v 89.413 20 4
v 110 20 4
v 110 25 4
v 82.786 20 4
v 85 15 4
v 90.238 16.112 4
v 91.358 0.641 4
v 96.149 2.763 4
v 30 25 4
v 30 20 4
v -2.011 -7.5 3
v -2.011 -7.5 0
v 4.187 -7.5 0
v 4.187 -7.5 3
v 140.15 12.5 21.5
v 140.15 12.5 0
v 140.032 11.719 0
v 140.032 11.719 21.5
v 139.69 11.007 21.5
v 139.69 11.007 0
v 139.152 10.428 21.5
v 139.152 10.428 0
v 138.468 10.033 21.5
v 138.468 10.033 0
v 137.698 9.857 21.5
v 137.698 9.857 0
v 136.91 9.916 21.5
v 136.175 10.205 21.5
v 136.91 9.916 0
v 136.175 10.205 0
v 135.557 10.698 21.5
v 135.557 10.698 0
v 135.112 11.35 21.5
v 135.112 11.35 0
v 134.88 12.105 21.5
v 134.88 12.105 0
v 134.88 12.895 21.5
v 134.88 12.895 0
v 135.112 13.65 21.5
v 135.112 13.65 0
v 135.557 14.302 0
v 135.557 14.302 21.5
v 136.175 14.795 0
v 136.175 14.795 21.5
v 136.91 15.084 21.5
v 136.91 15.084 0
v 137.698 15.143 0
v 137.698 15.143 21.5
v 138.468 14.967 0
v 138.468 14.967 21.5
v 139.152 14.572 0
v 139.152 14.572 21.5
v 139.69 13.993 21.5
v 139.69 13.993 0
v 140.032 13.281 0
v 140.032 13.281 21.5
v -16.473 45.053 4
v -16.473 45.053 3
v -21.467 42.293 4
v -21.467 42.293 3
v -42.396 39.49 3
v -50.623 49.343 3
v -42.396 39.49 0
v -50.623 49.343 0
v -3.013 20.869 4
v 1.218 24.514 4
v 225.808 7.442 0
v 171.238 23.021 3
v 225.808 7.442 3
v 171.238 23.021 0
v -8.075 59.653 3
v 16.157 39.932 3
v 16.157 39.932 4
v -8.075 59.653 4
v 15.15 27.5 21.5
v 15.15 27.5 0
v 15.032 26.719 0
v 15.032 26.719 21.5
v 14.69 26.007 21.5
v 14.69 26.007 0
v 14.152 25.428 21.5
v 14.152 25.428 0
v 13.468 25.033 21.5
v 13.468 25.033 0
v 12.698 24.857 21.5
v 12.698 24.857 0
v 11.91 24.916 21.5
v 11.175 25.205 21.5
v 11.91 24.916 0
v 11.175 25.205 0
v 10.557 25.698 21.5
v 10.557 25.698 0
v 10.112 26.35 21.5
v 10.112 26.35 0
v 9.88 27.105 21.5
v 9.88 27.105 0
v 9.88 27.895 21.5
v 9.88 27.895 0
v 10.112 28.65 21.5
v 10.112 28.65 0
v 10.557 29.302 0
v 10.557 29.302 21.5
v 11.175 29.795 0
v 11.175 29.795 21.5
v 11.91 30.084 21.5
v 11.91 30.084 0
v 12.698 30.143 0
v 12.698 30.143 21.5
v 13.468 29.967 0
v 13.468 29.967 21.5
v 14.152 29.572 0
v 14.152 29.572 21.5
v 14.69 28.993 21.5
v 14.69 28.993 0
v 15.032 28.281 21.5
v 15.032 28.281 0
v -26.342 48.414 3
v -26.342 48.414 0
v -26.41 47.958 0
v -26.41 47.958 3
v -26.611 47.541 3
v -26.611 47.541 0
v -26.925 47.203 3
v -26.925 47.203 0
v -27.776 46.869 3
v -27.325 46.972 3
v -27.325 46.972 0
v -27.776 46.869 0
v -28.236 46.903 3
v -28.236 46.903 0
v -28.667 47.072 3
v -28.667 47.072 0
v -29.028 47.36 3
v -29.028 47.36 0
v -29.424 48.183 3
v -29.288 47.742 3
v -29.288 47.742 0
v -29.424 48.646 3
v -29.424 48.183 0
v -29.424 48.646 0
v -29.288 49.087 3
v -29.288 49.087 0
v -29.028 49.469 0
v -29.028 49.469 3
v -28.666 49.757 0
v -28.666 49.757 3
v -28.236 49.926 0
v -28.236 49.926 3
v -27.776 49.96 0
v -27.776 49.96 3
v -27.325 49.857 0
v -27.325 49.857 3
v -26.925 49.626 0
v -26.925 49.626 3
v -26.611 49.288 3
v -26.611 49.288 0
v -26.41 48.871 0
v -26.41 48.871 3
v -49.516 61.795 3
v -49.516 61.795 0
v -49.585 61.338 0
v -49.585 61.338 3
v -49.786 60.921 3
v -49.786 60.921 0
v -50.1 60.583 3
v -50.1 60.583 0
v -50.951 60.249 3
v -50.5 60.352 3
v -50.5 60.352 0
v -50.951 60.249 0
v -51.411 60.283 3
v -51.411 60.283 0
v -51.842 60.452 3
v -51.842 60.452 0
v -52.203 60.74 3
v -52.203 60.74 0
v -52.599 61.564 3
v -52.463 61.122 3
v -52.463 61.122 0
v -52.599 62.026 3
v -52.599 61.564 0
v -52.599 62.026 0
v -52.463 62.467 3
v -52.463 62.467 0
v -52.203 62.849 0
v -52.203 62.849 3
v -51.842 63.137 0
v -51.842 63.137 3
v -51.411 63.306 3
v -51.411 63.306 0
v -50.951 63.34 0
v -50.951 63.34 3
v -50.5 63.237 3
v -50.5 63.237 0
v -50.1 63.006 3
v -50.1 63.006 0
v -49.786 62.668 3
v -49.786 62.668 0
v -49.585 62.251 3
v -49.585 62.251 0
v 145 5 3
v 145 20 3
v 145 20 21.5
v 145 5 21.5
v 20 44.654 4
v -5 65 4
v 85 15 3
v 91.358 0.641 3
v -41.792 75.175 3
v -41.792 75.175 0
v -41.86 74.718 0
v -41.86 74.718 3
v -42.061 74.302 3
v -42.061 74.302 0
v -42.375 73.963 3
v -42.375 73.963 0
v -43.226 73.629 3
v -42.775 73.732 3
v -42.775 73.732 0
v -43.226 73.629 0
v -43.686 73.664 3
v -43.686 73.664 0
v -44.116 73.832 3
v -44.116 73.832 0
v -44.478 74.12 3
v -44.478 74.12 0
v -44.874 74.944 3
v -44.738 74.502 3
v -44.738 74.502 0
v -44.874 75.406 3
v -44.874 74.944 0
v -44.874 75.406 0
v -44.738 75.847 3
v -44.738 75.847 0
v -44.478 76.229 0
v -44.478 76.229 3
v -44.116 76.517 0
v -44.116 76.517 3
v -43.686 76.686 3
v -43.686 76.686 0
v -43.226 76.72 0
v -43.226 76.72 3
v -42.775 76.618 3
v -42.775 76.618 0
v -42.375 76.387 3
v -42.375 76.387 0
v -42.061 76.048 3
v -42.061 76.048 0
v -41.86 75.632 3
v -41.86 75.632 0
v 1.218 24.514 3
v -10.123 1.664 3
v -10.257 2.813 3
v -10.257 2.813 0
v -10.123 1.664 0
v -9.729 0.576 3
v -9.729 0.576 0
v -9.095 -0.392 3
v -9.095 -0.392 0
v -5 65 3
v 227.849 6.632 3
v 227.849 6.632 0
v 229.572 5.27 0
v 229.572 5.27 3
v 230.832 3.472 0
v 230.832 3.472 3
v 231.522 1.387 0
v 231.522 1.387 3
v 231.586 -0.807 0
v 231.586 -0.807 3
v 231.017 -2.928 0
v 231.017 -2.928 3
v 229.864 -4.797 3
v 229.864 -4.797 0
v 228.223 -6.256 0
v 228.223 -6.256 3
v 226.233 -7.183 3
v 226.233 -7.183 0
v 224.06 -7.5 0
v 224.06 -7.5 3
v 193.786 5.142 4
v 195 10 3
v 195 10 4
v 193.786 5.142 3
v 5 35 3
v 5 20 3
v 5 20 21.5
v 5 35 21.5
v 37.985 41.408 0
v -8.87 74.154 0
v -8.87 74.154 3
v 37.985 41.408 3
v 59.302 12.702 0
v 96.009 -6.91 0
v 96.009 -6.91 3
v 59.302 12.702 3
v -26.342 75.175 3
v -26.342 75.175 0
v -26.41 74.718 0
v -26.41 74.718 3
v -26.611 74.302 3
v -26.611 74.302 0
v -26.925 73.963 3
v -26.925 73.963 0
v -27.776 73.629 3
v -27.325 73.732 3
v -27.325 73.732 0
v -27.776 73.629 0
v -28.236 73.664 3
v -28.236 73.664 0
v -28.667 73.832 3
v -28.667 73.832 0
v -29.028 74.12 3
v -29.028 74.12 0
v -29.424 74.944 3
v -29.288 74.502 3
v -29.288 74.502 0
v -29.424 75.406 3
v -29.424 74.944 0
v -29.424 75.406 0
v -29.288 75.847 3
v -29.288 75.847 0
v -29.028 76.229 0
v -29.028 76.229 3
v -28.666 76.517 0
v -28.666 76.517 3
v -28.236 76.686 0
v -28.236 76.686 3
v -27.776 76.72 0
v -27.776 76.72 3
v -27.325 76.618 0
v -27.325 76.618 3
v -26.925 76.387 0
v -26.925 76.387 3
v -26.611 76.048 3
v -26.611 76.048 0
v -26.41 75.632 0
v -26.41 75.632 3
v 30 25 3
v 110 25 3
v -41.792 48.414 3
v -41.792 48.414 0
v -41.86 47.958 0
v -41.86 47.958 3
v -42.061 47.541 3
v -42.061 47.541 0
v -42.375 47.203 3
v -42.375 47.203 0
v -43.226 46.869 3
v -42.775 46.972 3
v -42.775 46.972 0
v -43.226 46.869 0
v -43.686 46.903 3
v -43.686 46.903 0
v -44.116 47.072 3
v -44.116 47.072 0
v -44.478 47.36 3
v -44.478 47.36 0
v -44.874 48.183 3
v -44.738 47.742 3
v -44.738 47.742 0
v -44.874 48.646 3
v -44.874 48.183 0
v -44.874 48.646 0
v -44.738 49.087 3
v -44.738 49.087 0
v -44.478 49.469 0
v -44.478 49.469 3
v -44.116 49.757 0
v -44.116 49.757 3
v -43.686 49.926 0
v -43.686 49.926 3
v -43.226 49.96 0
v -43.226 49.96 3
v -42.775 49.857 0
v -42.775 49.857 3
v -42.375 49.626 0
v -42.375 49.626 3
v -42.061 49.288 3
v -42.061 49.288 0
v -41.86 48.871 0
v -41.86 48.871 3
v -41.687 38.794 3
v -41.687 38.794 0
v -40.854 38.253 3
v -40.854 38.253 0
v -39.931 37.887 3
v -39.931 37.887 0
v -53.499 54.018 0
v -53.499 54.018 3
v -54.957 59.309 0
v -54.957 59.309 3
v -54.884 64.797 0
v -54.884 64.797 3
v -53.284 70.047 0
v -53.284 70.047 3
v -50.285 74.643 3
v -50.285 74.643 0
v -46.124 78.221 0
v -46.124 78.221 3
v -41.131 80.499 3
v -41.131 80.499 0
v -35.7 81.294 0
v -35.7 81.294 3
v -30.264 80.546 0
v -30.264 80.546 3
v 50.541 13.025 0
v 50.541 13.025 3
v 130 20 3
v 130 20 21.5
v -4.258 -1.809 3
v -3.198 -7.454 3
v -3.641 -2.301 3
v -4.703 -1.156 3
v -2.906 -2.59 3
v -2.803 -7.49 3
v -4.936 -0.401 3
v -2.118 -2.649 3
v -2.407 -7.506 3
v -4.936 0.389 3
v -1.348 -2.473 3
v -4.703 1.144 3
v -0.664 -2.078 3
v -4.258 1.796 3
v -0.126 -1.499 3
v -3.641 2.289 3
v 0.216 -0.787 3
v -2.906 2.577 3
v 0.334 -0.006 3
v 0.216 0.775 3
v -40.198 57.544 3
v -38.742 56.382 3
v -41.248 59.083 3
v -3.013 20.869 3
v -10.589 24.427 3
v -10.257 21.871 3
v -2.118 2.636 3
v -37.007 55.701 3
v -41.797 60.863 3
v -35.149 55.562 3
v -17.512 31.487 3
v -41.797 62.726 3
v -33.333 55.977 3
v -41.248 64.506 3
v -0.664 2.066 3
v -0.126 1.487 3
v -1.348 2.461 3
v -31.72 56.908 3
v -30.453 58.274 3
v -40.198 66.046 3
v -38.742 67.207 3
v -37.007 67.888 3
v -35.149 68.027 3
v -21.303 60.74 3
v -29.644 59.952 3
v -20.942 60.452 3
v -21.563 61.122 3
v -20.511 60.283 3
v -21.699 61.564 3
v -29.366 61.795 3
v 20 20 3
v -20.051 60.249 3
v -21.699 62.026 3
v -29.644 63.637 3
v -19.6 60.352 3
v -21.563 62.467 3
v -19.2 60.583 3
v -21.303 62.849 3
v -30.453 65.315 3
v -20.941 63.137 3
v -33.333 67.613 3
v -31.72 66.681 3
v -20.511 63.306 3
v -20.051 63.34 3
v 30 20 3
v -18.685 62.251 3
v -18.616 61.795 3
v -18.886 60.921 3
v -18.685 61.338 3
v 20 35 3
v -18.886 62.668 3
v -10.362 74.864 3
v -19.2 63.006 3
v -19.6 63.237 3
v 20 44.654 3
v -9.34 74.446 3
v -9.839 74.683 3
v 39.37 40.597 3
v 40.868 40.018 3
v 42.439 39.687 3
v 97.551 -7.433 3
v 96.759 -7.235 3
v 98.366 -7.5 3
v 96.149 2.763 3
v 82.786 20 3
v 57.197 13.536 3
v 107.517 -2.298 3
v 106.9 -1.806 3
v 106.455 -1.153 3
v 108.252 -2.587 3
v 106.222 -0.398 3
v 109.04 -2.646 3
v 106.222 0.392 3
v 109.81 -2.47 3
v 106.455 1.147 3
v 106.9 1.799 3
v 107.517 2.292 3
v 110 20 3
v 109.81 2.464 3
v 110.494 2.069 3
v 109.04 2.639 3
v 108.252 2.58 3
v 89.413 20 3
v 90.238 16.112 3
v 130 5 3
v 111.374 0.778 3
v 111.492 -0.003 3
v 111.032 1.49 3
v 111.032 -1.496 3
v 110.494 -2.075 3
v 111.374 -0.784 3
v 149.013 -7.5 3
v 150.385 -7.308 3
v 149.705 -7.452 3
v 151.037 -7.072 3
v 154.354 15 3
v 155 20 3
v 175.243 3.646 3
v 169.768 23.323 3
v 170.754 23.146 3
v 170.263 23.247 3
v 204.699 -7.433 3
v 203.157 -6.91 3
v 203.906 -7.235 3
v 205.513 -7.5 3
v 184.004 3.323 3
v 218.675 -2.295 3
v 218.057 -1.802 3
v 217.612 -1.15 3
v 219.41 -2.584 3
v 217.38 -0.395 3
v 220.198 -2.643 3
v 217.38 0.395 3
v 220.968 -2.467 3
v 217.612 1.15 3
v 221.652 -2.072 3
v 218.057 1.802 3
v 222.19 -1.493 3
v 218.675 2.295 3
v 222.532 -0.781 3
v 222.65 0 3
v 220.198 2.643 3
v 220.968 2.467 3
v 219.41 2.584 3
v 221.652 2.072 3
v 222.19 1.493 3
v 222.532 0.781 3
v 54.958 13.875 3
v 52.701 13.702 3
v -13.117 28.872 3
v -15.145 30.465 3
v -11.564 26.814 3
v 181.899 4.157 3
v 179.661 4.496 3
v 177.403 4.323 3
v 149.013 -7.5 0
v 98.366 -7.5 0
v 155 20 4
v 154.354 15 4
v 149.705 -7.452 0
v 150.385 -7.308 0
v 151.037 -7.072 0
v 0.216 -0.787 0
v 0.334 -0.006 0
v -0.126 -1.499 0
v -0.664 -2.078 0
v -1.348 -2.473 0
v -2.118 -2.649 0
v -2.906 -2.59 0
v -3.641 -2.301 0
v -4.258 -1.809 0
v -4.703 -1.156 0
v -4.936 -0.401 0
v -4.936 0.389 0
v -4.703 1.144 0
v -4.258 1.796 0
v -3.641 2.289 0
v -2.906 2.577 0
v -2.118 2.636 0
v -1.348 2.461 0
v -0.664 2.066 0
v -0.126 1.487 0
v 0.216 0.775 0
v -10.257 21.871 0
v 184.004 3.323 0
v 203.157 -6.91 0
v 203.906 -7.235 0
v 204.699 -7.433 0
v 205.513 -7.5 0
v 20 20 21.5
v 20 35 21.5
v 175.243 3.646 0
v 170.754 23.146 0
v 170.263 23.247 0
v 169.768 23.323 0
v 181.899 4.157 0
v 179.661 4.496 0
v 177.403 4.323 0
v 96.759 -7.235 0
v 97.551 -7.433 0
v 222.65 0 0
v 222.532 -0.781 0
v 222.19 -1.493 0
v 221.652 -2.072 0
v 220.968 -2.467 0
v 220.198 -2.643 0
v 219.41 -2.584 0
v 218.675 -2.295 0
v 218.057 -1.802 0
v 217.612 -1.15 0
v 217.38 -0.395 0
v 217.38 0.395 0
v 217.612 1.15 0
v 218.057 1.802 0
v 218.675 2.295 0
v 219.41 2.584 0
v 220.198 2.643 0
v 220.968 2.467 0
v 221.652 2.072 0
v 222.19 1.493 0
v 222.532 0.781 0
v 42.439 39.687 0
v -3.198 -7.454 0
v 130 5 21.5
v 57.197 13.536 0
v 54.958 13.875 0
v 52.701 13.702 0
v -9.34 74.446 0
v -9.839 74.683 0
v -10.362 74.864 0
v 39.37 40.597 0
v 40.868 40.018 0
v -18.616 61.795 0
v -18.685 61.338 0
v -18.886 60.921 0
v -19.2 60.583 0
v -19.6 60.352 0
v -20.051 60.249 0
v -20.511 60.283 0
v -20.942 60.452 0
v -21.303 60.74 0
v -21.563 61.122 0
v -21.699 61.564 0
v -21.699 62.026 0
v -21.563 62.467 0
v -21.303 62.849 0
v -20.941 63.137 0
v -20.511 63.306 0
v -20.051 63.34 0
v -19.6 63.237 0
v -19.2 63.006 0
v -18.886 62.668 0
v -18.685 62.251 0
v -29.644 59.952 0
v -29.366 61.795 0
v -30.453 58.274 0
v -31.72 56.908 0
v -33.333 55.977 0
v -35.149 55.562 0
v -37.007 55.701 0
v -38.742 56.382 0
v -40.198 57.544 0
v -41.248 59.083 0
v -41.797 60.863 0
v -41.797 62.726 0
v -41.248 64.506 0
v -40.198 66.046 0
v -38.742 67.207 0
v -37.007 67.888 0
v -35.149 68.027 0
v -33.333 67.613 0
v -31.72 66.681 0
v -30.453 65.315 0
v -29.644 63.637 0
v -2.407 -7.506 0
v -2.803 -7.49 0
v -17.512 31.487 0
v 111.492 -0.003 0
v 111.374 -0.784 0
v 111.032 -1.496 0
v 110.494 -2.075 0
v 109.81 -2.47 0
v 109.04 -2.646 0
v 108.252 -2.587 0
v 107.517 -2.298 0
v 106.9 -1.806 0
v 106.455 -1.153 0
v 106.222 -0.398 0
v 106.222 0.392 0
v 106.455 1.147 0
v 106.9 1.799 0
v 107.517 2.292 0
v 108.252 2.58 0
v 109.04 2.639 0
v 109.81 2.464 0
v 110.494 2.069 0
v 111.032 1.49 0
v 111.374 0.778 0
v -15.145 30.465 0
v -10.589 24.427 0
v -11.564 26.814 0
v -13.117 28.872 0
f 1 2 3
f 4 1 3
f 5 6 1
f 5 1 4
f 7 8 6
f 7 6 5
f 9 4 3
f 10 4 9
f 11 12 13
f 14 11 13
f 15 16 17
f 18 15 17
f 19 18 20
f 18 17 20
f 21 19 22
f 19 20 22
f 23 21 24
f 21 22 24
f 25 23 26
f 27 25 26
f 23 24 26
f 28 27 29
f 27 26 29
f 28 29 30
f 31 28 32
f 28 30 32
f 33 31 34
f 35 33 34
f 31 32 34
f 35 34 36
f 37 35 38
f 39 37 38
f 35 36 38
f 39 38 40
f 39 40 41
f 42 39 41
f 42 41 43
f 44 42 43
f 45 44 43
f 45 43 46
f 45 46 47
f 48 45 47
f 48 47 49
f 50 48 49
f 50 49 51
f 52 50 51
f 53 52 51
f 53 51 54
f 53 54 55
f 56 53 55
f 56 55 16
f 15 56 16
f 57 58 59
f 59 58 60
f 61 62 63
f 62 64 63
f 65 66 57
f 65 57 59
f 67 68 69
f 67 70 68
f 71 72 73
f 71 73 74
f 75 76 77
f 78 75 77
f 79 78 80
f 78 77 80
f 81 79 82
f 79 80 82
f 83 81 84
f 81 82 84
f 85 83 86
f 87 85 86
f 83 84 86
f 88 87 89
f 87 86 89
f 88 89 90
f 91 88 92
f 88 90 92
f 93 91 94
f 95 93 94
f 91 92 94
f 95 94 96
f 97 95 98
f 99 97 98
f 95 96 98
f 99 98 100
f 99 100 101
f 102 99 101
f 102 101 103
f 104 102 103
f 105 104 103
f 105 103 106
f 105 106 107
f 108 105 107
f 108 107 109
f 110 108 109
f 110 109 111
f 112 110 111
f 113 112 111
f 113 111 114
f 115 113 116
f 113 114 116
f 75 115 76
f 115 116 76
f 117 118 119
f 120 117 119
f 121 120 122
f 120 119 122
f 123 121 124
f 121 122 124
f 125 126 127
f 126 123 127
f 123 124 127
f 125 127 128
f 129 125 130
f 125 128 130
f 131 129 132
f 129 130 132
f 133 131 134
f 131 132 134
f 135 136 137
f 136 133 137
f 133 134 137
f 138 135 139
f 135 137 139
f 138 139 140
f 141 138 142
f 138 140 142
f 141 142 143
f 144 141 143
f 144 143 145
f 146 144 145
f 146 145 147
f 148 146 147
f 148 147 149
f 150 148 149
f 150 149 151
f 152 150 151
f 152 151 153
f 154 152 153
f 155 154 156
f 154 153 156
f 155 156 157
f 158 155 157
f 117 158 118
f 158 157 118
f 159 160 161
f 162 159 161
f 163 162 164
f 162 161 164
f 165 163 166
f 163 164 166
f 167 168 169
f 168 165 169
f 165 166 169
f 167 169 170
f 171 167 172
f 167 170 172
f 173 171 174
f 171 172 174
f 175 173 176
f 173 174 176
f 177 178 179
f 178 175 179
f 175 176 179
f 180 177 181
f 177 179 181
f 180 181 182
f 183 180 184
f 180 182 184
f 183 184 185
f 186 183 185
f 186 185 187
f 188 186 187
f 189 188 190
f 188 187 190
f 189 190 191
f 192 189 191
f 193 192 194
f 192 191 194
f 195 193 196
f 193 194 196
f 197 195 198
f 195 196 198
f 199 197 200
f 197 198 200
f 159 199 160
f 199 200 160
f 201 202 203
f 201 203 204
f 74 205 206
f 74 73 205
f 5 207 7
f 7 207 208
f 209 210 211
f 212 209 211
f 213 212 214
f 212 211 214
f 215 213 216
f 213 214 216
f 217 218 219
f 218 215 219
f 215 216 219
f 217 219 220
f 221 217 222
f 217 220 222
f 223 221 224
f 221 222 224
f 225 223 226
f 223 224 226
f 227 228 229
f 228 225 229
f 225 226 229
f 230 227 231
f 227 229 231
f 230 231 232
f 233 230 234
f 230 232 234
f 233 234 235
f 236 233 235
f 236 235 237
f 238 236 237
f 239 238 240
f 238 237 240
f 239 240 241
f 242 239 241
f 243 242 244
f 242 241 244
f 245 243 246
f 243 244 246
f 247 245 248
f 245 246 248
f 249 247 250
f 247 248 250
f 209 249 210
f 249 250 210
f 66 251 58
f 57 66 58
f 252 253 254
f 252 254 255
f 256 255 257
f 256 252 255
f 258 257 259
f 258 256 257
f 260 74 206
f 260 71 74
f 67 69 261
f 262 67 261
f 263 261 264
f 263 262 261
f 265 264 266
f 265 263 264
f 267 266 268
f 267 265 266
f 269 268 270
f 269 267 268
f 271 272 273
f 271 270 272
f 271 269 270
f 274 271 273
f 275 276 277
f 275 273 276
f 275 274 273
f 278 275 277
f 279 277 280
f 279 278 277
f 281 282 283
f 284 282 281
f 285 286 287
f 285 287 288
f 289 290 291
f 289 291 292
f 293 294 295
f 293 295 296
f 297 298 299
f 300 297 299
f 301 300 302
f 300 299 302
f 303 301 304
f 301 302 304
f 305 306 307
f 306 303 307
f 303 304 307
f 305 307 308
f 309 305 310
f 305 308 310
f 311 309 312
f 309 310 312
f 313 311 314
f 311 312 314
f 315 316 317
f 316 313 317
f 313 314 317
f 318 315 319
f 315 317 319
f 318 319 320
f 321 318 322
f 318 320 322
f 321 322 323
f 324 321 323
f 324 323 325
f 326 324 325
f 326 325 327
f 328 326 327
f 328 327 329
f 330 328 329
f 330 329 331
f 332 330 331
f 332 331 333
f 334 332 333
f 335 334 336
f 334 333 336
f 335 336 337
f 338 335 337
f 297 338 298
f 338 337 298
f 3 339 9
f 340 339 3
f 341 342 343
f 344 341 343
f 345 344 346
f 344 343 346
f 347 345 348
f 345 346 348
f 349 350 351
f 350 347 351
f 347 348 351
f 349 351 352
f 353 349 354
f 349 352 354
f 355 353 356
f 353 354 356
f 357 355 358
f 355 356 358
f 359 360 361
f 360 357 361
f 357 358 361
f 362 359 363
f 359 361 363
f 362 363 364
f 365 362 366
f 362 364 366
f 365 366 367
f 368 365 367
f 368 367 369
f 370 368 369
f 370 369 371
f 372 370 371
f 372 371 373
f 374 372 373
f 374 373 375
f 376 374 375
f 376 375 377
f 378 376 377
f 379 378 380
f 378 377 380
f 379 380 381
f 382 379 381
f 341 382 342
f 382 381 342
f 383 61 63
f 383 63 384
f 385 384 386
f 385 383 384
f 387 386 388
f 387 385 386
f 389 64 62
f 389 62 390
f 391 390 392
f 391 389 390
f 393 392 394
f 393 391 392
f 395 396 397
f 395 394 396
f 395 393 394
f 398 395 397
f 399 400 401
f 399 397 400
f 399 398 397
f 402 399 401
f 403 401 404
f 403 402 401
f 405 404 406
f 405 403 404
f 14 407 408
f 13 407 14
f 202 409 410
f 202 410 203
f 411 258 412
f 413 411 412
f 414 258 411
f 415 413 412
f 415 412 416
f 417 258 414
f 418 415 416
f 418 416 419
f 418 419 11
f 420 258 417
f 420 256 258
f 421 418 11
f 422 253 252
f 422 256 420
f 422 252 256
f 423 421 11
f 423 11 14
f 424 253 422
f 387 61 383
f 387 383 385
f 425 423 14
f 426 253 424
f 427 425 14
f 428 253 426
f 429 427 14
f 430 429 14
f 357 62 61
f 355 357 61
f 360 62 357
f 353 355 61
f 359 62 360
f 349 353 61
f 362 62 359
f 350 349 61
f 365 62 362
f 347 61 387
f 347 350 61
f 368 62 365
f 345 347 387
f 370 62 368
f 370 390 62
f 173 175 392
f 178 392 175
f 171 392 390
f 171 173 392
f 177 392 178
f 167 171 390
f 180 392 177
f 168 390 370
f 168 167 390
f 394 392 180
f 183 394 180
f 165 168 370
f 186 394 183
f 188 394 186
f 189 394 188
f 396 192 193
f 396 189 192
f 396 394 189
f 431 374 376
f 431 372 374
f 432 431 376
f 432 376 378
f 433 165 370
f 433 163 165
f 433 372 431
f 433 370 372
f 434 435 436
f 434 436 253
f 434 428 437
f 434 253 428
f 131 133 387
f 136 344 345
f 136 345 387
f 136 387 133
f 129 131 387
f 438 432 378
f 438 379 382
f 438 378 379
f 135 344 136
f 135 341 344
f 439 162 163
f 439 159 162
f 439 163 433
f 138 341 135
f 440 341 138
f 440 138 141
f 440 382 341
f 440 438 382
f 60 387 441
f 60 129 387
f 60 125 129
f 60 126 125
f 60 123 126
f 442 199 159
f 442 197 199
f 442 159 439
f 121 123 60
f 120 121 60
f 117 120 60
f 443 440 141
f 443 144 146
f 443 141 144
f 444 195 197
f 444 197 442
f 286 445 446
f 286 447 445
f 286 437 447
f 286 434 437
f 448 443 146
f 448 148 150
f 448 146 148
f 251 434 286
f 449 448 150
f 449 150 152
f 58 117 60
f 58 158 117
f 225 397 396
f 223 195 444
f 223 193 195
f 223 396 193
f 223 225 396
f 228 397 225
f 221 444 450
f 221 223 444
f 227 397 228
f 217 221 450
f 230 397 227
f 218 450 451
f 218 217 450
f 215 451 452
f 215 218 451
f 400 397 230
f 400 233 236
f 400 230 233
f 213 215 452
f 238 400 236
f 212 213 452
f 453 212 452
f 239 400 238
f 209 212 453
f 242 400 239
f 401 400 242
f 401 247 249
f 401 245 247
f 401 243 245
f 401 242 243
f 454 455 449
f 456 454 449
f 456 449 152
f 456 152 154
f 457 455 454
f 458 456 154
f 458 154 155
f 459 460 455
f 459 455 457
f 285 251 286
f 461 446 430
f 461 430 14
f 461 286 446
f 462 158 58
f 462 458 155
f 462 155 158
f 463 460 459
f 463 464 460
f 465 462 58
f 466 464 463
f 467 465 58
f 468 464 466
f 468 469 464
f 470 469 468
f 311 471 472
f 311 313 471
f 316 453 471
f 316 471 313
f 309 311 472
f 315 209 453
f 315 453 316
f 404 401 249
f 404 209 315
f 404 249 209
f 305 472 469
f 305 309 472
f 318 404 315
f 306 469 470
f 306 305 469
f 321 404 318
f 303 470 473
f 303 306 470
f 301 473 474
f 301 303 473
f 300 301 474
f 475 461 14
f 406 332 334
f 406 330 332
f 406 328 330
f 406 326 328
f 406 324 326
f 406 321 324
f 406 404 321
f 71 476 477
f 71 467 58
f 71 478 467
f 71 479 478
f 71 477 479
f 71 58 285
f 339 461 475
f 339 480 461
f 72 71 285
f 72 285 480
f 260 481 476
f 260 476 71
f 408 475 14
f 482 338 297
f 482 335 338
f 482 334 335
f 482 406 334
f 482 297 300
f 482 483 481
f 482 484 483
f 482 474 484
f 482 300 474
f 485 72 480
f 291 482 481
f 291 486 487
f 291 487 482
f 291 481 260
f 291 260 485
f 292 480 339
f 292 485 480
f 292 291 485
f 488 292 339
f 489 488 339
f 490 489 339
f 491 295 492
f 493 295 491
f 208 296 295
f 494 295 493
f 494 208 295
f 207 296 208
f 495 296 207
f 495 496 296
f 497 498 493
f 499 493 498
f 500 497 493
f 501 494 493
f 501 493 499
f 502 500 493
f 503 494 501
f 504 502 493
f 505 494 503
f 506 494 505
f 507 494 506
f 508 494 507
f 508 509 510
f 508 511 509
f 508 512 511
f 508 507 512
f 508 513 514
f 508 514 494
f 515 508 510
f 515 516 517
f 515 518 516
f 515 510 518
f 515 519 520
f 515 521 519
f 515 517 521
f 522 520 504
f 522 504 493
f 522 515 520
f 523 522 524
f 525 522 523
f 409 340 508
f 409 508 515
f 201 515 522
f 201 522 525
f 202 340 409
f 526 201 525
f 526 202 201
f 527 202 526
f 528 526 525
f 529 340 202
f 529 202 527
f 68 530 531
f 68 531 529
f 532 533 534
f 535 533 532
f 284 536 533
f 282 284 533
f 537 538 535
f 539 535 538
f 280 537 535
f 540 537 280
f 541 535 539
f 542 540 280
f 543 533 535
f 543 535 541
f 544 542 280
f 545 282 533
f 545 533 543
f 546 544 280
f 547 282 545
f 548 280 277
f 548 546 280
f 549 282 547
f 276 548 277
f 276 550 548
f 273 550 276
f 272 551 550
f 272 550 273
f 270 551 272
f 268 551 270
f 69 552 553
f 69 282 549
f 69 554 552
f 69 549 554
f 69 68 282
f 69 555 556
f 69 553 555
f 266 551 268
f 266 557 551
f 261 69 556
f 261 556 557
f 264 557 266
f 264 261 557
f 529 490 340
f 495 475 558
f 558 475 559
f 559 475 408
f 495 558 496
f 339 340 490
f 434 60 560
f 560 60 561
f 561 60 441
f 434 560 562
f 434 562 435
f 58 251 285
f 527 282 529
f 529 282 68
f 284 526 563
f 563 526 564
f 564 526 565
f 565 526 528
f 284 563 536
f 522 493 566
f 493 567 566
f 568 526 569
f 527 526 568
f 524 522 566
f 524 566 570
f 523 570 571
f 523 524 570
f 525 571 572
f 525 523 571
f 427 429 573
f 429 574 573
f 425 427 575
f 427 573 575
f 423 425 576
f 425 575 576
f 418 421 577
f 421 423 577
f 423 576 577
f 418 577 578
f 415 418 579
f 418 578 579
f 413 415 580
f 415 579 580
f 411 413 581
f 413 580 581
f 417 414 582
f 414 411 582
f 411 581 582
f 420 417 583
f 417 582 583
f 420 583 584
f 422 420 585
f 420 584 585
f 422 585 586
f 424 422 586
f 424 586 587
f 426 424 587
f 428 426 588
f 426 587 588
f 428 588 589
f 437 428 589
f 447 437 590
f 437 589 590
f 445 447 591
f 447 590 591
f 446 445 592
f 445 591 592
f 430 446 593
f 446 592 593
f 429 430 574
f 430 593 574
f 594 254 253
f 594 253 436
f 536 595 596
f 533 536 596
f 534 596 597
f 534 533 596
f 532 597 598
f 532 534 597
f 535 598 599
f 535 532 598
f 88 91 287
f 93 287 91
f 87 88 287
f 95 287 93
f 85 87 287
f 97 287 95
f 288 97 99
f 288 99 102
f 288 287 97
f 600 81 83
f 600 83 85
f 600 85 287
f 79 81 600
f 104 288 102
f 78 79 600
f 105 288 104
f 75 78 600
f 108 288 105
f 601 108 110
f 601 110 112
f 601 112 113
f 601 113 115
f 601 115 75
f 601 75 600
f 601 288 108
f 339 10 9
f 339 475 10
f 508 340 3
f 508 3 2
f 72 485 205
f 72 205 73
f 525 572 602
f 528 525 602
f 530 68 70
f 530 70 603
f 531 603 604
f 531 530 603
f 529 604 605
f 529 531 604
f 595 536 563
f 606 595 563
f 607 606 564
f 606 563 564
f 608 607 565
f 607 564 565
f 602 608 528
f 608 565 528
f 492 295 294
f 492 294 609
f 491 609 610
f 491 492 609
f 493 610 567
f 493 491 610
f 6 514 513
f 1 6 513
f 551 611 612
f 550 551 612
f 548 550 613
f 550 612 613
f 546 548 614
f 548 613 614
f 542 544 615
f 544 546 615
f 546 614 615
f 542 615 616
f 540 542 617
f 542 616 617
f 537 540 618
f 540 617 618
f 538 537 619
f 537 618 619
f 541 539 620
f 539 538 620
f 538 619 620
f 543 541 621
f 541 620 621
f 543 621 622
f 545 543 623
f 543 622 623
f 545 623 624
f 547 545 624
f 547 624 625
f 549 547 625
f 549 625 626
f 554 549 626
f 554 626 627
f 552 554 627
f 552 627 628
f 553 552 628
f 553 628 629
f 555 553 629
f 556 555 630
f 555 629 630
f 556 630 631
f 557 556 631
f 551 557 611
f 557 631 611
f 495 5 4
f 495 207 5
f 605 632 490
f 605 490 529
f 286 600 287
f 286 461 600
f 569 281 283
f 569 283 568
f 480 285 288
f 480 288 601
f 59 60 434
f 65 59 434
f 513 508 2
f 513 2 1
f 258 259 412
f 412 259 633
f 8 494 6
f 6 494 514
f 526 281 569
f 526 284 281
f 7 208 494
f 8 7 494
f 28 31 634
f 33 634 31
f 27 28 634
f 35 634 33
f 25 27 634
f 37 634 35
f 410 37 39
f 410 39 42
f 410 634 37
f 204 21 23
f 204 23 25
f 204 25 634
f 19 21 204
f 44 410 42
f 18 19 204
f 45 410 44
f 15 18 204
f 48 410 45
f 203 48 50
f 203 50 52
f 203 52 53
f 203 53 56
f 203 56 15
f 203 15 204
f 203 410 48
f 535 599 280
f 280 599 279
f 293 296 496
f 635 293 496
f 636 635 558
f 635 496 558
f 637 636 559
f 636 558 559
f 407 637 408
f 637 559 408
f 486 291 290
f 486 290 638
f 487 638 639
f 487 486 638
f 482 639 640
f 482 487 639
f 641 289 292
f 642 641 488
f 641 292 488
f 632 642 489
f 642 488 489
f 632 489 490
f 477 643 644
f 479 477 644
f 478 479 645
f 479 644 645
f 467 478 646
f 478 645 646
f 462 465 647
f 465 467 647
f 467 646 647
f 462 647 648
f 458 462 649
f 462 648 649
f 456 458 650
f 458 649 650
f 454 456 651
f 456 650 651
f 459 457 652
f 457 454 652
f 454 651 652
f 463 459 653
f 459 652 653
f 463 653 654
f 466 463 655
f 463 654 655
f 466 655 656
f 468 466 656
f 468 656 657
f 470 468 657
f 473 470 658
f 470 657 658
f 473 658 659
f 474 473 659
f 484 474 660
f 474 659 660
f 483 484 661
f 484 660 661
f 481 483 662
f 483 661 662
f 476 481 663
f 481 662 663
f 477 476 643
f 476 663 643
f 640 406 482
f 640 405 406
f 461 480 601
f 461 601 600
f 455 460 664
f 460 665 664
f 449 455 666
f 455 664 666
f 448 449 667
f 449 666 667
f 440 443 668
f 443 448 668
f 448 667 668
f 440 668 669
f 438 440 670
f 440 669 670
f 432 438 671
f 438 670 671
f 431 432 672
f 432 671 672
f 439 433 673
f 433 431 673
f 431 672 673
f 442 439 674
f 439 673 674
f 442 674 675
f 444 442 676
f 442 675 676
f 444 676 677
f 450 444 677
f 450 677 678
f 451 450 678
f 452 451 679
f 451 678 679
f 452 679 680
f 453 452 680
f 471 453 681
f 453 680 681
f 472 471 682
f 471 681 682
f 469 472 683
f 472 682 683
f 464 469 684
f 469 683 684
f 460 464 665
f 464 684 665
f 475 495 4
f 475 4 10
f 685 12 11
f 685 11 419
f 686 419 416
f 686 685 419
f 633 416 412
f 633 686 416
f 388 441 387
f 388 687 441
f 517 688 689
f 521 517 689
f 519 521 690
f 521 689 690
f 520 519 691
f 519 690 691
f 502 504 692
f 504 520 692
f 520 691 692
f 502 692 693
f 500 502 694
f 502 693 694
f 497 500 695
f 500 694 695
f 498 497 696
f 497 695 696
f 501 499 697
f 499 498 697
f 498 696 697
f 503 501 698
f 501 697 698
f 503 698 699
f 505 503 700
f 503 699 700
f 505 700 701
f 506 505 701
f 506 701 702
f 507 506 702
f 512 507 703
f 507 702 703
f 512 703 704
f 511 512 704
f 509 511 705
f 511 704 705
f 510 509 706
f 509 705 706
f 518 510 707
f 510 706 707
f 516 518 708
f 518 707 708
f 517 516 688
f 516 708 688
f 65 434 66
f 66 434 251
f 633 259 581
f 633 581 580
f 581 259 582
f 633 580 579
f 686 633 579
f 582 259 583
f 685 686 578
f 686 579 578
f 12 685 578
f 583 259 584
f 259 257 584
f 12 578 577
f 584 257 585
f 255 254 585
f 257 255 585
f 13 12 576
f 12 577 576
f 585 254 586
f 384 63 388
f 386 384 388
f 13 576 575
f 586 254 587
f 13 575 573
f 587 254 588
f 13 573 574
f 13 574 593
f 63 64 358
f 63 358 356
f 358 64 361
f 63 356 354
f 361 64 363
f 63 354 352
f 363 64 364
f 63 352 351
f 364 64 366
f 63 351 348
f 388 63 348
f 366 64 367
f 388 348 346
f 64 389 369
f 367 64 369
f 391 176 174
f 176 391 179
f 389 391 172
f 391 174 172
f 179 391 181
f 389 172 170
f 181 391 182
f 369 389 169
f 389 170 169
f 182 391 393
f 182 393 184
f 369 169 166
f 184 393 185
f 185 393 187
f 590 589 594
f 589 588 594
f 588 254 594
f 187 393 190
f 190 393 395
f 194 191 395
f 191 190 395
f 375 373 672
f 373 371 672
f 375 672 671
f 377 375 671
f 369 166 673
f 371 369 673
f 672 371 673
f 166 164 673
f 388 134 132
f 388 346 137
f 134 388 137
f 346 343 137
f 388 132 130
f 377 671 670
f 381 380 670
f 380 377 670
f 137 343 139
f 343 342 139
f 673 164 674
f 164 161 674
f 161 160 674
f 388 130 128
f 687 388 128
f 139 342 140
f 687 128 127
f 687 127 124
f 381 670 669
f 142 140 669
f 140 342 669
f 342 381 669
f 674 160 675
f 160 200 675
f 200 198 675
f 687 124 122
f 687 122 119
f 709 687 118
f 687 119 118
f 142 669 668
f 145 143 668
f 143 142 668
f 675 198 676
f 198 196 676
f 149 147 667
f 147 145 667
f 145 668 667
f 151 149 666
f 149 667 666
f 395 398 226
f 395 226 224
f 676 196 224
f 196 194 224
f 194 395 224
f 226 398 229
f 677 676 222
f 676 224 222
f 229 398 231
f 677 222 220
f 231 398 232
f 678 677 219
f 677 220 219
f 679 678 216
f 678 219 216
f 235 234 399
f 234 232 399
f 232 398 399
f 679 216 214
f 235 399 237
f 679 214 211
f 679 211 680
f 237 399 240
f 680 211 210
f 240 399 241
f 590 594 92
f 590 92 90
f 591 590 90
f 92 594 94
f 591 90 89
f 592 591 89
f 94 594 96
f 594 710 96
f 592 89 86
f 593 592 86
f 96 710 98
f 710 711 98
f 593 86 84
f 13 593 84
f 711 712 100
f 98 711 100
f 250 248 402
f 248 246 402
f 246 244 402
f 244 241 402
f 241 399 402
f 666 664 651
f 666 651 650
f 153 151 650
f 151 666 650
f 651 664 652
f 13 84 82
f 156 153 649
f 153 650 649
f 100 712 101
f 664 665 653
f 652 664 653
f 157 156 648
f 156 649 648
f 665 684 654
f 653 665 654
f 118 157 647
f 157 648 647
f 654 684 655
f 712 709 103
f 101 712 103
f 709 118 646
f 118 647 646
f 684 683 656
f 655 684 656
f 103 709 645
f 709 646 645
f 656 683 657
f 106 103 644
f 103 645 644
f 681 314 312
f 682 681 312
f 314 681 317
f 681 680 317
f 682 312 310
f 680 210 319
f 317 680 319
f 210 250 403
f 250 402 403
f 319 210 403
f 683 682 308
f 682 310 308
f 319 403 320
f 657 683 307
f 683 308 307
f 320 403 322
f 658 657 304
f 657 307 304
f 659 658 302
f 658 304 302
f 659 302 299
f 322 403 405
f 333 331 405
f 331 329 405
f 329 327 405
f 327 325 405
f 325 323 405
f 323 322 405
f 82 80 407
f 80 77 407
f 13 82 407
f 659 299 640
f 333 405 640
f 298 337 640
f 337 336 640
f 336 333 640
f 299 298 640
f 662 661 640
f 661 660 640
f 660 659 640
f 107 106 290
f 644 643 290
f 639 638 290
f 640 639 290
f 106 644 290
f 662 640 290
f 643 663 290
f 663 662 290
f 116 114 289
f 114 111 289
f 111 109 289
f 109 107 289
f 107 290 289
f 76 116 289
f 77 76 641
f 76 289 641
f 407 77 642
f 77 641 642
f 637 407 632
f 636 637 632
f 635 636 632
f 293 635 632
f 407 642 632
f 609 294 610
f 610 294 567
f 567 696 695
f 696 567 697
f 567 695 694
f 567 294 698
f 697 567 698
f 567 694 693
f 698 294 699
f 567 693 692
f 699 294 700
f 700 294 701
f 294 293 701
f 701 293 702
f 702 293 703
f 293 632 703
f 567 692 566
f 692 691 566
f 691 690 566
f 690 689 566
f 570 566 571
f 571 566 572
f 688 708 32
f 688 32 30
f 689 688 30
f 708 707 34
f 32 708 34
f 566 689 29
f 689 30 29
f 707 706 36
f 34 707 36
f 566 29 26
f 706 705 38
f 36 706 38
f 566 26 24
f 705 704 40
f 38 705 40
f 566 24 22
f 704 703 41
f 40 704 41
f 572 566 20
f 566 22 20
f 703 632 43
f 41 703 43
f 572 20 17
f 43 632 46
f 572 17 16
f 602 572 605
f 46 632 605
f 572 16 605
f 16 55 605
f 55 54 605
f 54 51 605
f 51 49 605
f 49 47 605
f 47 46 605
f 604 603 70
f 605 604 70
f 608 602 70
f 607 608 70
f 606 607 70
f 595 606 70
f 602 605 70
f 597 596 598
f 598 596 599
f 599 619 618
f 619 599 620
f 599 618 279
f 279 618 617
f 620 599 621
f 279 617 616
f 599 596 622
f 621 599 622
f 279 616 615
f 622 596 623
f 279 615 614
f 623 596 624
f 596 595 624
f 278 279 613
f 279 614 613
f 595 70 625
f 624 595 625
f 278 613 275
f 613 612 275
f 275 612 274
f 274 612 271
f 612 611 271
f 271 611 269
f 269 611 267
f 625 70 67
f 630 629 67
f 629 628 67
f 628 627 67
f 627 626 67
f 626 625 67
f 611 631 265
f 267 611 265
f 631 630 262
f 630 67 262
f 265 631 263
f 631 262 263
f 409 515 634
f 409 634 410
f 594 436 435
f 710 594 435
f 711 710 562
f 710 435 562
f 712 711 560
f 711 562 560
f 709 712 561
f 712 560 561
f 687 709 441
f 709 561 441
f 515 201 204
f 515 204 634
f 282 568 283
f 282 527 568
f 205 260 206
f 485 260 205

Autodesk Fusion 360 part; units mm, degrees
sketch "Sketch1" plane through (0, 0, 0) normal (0, 0, 1) x (1, 0, 0)
  line L0 (-50.6234, 49.3431) -> (-3.198, -7.4541)
  line L1 (-2.0113, -7.5) -> (224.0597, -7.5)
  line L2 (-30.2635, 80.5455) -> (225.8084, 7.442)
  line L3 (218.275, -2.7029) -> (218.4394, -2.7498)
  arc A0 (225, -2.55) -> (225, 2.55) centre (225, 0) ccw
  arc A1 (224.0597, -7.5) -> (225.8084, 7.442) centre (224.0646, 0.0728) ccw
  arc A2 (-3.198, -7.4541) -> (-2.0113, -7.5) centre (-2.3159, -0.0062) ccw
  arc A3 (-30.2635, 80.5455) -> (-50.6234, 49.3431) centre (-35.6165, 61.7946) ccw
  circle A4 centre (-35.6165, 61.7946) radius 19.5
  line L4 (55, 15) -> (4.1872, -7.5)
  line L5 (-9.5564, 74.634) -> (40, 40)
  line L6 (-10.2571, 1) -> (-10.2571, 29.4154)
  line L7 (-10.2571, 29.4154) -> (-41.41, 38.3089)
  circle A5 centre (220, 0) radius 2.65
  circle A6 centre (-2.3159, -0.0062) radius 2.65
  circle A7 centre (-35.6165, 61.7946) radius 6.25
  circle A8 centre (-35.6165, 61.7946) radius 18.5
  line L8 (5, 35) -> (20, 35)
  line L9 (20, 35) -> (20, 20)
  line L10 (20, 20) -> (5, 20)
  line L11 (5, 20) -> (5, 35)
  line L12 (130, 20) -> (145, 20)
  line L13 (145, 20) -> (145, 5)
  line L14 (145, 5) -> (130, 5)
  line L15 (130, 5) -> (130, 20)
  circle A9 centre (-20.1665, 61.7946) radius 1.55
  circle A10 centre (-27.8915, 75.1747) radius 1.55
  circle A11 centre (-43.3415, 75.1747) radius 1.55
  circle A12 centre (-51.0665, 61.7946) radius 1.55
  circle A13 centre (-43.3415, 48.4145) radius 1.55
  circle A14 centre (-27.8915, 48.4145) radius 1.55
  circle A15 centre (108.8421, -0.0031) radius 2.65
  line L16 (97.1136, -7.5) -> (55, 15)
  line L17 (150.0703, -7.5) -> (179.7021, 5.621)
  line L18 (179.7021, 5.621) -> (204.2609, -7.5)
  line L19 (40, 40) -> (170.5146, 23.2273)
  circle A16 centre (12.5, 27.5) radius 2.65
  circle A17 centre (137.5, 12.5) radius 2.65
  dimension "d10" = 5.1
  dimension "d44" = 39
  dimension "d49" = 5.3
  dimension "d50" = 5.3
  dimension "d66" = 12.5
  dimension "d67" = 37
  dimension "d114" = 3.1
  dimension "d116" = 360
  dimension "d135" = 5.3
  dimension "d140" = 5.3
  dimension "d141" = 5.3
extrude "Extrude24" add sketch "Sketch1" along normal blind 3 contours L0 L1 L2 A1 A2 A4 L4 L5 L6 L7 L16 L17 L18 L19 | A3 A4 | A8 | L8 L9 L10 L11 | L12 L13 L14 L15 | A16 | A17
extrude "Extrude25" add sketch "Sketch1" along normal blind 21.5 contours L8 L9 L10 L11 | L12 L13 L14 L15 | A16 | A17
extrude "Extrude26" cut sketch "Sketch1" along normal blind 22 contours A16 | A17
fillet "Fillet14" radius 5 1 edges at (-41.41, 38.3089, 1.5)
fillet "Fillet15" radius 10 1 edges at (-10.2571, 29.4154, 1.5)
fillet "Fillet16" radius 5 1 edges at (-10.2571, 1, 1.5)
fillet "Fillet17" radius 10 1 edges at (55, 15, 1.5)
fillet "Fillet18" radius 5 1 edges at (97.1136, -7.5, 1.5)
fillet "Fillet19" radius 5 1 edges at (150.0703, -7.5, 1.5)
fillet "Fillet20" radius 10 1 edges at (179.7021, 5.621, 1.5)
fillet "Fillet21" radius 5 1 edges at (204.2609, -7.5, 1.5)
fillet "Fillet22" radius 10 1 edges at (170.5146, 23.2273, 1.5)
fillet "Fillet23" radius 10 1 edges at (40, 40, 1.5)
fillet "Fillet24" radius 5 1 edges at (-9.5564, 74.634, 1.5)
sketch "Sketch4" plane through (0, 0, 3) normal (0, 0, 1) x (-1, 0, 0)
  arc A0 (8.87, -74.1543) -> (10.3617, -74.8639) centre (11.7343, -70.056) ccw
  line L0 (10.3617, -74.8639) -> (30.2635, -80.5455)
  arc A1 (30.2635, -80.5455) -> (50.6234, -49.3431) centre (35.6165, -61.7946) ccw
  line L1 (50.6234, -49.3431) -> (42.396, -39.4898)
  arc A2 (42.396, -39.4898) -> (39.9306, -37.8866) centre (38.558, -42.6945) ccw
  line L2 (39.9306, -37.8866) -> (17.512, -31.4865)
  arc A3 (10.2571, -21.8707) -> (17.512, -31.4865) centre (20.2571, -21.8707) ccw
  line L3 (10.2571, -21.8707) -> (10.2571, -2.813)
  arc A4 (10.2571, -2.813) -> (9.0951, 0.3917) centre (5.2571, -2.813) ccw
  line L4 (9.0951, 0.3917) -> (3.198, 7.4541)
  arc A5 (3.198, 7.4541) -> (2.0113, 7.5) centre (2.3159, 0.0062) ccw
  line L5 (2.0113, 7.5) -> (-4.1872, 7.5)
  line L6 (-4.1872, 7.5) -> (-50.5405, -13.0253)
  arc A6 (-59.3017, -12.7018) -> (-50.5405, -13.0253) centre (-54.5894, -3.8817) ccw
  line L7 (-59.3017, -12.7018) -> (-96.0094, 6.91)
  arc A7 (-96.0094, 6.91) -> (-98.3655, 7.5) centre (-98.3655, 2.5) ccw
  line L8 (-98.3655, 7.5) -> (-149.0128, 7.5)
  arc A8 (-149.0128, 7.5) -> (-151.0373, 7.0718) centre (-149.0128, 2.5) ccw
  line L9 (-151.0373, 7.0718) -> (-175.2426, -3.6463)
  arc A9 (-184.0038, -3.3228) -> (-175.2426, -3.6463) centre (-179.2915, 5.4973) ccw
  line L10 (-184.0038, -3.3228) -> (-203.1567, 6.91)
  arc A10 (-203.1567, 6.91) -> (-205.5128, 7.5) centre (-205.5128, 2.5) ccw
  line L11 (-205.5128, 7.5) -> (-224.0597, 7.5)
  arc A11 (-224.0597, 7.5) -> (-225.8084, -7.442) centre (-224.0646, -0.0728) ccw
  line L12 (-225.8084, -7.442) -> (-171.2385, -23.0206)
  arc A12 (-171.2385, -23.0206) -> (-169.768, -23.3232) centre (-168.4934, -13.4048) ccw
  line L13 (-169.768, -23.3232) -> (-42.4386, -39.6866)
  arc A13 (-37.9848, -41.4084) -> (-42.4386, -39.6866) centre (-43.7132, -49.605) ccw
  line L14 (-37.9848, -41.4084) -> (8.87, -74.1543)
  line L15 (-5, -20) -> (-5, -35)
  line L16 (-5, -35) -> (-20, -35)
  line L17 (-20, -35) -> (-20, -20)
  line L18 (-20, -20) -> (-5, -20)
  line L19 (-130, -5) -> (-130, -20)
  line L20 (-130, -20) -> (-145, -20)
  line L21 (-145, -20) -> (-145, -5)
  line L22 (-145, -5) -> (-130, -5)
  circle A14 centre (35.6165, -61.7946) radius 6.25
  circle A15 centre (2.3159, 0.0062) radius 2.65
  circle A16 centre (20.1665, -61.7946) radius 1.55
  circle A17 centre (43.3415, -48.4145) radius 1.55
  circle A18 centre (27.8915, -75.1747) radius 1.55
  circle A19 centre (43.3415, -75.1747) radius 1.55
  circle A20 centre (51.0665, -61.7946) radius 1.55
  circle A21 centre (-220, 0) radius 2.65
  circle A22 centre (27.8915, -48.4145) radius 1.55
  circle A23 centre (-108.8421, 0.0031) radius 2.65
  line L23 (-155, -20) -> (-195, -10)
  line L24 (-195, -10) -> (-193.7855, -5.142)
  line L25 (-193.7855, -5.142) -> (-154.3536, -15)
  line L26 (-154.3536, -15) -> (-155, -20)
  line L27 (-30, -25) -> (-110, -25)
  line L28 (-110, -25) -> (-110, -20)
  line L29 (-110, -20) -> (-30, -20)
  line L30 (-30, -20) -> (-30, -25)
  line L31 (-85, -15) -> (-91.3581, -0.6413)
  line L32 (-91.3581, -0.6413) -> (-96.149, -2.7627)
  line L33 (-96.149, -2.7627) -> (-90.238, -16.1118)
  line L34 (-90.238, -16.1118) -> (-89.4127, -20)
  line L35 (-85, -15) -> (-82.786, -20)
  line L36 (5, -65) -> (-20, -44.6537)
  line L37 (-20, -44.6537) -> (-16.1568, -39.9315)
  line L38 (-16.1568, -39.9315) -> (8.0754, -59.653)
  line L39 (8.0754, -59.653) -> (5, -65)
  line L40 (21.4667, -42.2926) -> (3.0133, -20.8693)
  line L41 (3.0133, -20.8693) -> (-1.2182, -24.5142)
  line L42 (-1.2182, -24.5142) -> (16.473, -45.0526)
  line L43 (16.473, -45.0526) -> (21.4667, -42.2926)
extrude "Extrude27" add sketch "Sketch4" along normal blind 1 contours L23 L24 L25 L26 | L27 L28 L29 L30 | L29 L31 L32 L33 L34 L35 | L36 L37 L38 L39 | L40 L41 L42 L43
